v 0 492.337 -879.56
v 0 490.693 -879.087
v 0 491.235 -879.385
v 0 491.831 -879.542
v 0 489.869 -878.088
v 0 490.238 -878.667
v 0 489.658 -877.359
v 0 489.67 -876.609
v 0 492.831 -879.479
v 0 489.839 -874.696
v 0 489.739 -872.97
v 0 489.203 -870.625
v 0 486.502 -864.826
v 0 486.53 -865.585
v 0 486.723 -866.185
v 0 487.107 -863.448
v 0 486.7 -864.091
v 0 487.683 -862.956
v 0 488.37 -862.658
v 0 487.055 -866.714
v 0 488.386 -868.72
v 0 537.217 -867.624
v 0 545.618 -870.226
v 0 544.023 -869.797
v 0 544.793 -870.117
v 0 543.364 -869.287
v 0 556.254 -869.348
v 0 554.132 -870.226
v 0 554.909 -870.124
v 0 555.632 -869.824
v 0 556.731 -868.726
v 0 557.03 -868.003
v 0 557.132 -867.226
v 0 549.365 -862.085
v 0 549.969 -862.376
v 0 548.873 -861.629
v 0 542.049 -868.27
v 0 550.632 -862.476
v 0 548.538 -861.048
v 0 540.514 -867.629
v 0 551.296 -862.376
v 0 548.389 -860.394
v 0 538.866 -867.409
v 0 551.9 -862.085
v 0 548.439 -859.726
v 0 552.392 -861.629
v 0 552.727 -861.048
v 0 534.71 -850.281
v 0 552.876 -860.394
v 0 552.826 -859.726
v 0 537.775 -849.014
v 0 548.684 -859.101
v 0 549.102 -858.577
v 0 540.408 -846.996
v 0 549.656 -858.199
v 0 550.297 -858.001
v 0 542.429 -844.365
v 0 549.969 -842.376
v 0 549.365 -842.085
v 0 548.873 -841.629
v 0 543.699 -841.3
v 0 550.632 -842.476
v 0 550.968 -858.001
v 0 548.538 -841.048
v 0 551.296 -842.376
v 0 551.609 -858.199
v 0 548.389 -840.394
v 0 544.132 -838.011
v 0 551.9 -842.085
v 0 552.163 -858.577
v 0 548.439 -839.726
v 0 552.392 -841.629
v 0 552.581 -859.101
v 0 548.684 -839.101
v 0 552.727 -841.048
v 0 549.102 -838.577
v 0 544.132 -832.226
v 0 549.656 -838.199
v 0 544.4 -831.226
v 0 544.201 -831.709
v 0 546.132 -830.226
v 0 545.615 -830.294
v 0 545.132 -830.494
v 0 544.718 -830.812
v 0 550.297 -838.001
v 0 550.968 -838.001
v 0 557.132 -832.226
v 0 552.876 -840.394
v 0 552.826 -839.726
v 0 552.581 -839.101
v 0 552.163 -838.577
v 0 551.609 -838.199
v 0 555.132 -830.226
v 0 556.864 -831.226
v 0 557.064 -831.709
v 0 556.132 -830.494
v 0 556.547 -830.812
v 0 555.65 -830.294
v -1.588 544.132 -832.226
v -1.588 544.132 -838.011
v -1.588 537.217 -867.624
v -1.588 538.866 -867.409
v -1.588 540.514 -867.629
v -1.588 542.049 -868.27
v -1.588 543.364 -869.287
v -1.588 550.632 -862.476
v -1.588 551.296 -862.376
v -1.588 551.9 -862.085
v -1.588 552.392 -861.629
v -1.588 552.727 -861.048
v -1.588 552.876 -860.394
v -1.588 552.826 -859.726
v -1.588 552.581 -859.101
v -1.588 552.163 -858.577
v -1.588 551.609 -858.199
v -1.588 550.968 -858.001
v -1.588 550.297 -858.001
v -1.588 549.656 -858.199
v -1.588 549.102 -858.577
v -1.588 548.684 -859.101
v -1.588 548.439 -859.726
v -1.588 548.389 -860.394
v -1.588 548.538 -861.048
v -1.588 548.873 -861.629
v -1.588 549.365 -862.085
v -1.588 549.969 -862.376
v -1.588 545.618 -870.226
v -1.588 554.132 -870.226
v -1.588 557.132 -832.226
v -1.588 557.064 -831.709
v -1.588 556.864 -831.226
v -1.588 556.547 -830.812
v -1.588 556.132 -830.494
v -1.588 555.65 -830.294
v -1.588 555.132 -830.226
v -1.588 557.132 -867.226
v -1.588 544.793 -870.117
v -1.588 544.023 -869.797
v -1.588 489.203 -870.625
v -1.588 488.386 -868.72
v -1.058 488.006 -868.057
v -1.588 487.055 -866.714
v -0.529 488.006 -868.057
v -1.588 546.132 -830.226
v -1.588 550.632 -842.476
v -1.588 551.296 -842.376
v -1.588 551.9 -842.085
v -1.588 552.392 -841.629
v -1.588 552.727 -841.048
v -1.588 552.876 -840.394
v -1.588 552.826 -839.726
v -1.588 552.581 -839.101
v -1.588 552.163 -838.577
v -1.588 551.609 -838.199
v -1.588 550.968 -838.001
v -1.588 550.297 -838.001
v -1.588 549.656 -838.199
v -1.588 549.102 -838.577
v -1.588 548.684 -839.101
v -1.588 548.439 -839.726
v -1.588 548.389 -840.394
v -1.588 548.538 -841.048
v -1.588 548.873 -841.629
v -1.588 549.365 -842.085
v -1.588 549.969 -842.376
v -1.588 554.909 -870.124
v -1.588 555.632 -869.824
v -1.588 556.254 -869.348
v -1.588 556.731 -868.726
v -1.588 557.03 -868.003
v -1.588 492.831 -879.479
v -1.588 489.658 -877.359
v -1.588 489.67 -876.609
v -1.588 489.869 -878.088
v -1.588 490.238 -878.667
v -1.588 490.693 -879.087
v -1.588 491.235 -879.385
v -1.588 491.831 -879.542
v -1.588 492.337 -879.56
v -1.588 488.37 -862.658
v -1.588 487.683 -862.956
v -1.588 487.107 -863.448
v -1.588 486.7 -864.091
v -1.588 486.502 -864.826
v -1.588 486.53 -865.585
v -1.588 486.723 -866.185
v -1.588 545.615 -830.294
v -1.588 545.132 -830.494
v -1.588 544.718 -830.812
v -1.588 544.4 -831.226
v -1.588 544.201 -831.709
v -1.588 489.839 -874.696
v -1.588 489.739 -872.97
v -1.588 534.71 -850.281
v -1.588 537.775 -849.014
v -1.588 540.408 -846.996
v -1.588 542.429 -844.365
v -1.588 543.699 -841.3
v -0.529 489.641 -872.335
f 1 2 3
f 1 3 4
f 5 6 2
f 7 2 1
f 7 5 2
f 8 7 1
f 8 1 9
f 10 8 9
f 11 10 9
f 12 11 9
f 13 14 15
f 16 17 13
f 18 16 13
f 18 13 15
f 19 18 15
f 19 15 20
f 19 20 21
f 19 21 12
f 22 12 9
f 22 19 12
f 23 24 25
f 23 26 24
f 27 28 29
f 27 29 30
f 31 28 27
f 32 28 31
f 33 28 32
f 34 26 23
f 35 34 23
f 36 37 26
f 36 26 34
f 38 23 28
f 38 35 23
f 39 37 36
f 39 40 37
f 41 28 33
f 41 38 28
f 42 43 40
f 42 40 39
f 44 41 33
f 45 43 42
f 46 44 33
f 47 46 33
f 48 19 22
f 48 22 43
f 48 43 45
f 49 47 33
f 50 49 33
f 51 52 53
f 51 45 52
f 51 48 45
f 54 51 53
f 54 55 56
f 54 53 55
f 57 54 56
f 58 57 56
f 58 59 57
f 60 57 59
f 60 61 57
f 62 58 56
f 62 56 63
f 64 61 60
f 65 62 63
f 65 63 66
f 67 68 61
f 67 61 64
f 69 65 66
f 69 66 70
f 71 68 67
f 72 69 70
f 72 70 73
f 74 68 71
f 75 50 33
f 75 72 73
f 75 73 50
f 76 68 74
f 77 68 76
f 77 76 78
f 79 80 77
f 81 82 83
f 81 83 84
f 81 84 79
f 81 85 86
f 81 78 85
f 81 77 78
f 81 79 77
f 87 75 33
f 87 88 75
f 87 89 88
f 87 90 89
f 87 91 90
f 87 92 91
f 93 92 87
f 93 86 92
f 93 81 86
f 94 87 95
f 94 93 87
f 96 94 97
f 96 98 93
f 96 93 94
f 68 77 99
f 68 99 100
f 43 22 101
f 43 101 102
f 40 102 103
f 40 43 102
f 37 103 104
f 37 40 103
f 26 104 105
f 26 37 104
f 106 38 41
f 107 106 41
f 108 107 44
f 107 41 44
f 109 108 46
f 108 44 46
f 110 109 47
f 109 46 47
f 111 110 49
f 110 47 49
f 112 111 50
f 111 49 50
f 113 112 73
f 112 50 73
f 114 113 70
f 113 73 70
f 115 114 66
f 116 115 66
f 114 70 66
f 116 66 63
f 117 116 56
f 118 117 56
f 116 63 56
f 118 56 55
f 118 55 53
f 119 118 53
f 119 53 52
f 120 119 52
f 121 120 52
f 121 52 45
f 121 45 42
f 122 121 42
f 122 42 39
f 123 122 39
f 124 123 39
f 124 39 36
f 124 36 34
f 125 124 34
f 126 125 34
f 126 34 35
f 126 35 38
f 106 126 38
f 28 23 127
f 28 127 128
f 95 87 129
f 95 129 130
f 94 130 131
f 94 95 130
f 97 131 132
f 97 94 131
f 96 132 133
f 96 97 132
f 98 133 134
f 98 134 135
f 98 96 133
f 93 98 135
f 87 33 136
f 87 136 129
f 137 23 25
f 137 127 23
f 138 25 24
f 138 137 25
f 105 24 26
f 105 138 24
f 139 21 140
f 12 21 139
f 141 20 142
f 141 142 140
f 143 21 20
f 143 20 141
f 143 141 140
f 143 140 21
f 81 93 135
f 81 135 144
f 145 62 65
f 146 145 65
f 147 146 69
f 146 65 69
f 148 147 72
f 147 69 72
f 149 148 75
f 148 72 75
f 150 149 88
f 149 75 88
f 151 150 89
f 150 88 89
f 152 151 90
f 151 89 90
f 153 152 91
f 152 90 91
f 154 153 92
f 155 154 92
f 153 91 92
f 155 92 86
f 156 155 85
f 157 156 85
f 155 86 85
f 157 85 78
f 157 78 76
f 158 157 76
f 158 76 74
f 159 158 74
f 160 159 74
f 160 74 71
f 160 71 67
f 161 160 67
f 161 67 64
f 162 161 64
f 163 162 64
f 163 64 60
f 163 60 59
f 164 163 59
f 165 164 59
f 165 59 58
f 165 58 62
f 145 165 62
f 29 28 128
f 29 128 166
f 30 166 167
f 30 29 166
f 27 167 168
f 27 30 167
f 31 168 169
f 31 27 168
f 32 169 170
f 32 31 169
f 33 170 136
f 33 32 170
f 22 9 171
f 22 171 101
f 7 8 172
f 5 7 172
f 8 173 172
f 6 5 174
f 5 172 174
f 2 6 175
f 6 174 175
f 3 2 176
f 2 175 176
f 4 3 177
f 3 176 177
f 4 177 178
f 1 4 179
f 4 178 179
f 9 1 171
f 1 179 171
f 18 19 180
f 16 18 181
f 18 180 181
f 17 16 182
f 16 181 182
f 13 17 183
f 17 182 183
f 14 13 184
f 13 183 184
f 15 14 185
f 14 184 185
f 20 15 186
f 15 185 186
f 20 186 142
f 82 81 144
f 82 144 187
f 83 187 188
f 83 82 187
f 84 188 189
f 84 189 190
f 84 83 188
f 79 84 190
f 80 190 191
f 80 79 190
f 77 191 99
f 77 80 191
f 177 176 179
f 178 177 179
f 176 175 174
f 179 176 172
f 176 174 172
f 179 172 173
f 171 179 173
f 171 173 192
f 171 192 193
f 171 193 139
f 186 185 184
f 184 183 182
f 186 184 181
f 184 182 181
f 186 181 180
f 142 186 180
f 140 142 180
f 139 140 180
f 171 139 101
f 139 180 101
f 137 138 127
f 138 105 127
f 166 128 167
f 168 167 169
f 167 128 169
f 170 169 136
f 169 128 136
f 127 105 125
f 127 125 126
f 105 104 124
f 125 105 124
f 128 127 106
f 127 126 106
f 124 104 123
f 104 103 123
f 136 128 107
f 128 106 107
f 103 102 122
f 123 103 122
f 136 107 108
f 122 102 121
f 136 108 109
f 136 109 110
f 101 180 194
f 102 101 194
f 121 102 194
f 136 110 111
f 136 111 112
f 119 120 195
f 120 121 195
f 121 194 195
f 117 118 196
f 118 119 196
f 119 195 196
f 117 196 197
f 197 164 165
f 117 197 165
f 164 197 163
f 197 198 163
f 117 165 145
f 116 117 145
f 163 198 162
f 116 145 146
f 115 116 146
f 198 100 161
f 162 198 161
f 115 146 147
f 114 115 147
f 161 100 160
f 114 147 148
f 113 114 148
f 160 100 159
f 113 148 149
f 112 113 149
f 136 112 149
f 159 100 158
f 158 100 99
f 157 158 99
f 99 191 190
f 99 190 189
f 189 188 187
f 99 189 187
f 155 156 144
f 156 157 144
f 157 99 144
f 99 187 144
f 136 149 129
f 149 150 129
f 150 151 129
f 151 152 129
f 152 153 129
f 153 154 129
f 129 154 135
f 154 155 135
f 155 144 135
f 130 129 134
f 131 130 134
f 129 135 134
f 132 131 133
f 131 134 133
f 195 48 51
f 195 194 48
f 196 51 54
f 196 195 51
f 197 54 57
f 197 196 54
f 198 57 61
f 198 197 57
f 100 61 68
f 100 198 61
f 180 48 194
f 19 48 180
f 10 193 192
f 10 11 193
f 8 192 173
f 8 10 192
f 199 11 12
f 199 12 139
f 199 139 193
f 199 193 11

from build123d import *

# Parameters (mm, degrees)
BOSS_EXTRUDE1_DEPTH  = 1.5875
FILLET1_R            = 2.54
M4_CLEARANCE_HOLE1_D = 4.5
FILLET2_R            = 6.35
FILLET3_R            = 12.7
FILLET4_R            = 3.175


with BuildPart() as part:
    # Sketch1 → Boss-Extrude1 (new body)
    with BuildSketch(Plane(origin=(0, 0, 0), x_dir=(0, 0, -1), z_dir=(1, 0, 0))):
        with BuildLine():
            Line((832.226267655, 544.132439772), (843.624269089, 544.132439772))
            Line((843.624269089, 544.132439772), (847.764493389, 544.132439772))
            Line((847.764493389, 544.132439772), (865.776854812, 544.132439772))
            Line((865.776854812, 544.132439772), (869.917079112, 544.132439772))
            Line((869.917079112, 544.132439772), (870.226267655, 544.132439772))
            Line((870.226267655, 544.132439772), (870.226267655, 554.132439772))
            ThreePointArc((870.226267655, 554.132439772), (869.347587998, 556.253760115), (867.226267655, 557.132439772))
            Line((867.226267655, 557.132439772), (832.226267655, 557.132439772))
            ThreePointArc((832.226267655, 557.132439772), (830.812054092, 556.546653334), (830.226267655, 555.132439772))
            Line((830.226267655, 555.132439772), (830.226267655, 546.132439772))
            ThreePointArc((830.226267655, 546.132439772), (830.812054092, 544.718226209), (832.226267655, 544.132439772))
        make_face()
        with BuildLine():
            Line((847.764493389, 544.132439772), (863.880128333, 483.796291029))
            add(Edge.make_bspline(
                [(863.880128333, 483.796291029), (865.574478469, 486.592797057), (868.03804251, 488.340736874), (870.62475601, 489.202974707)],
                knots=[0.867438588, 0.867438588, 0.867438588, 0.867438588, 1, 1, 1, 1], degree=3, weights=[0.610334575, 0.693362976, 0.82325145, 1]))
            add(Edge.make_bspline(
                [(870.62475601, 489.202974707), (873.662795809, 490.21565464), (877.265107333, 490.148897283), (880.706436997, 488.236814526)],
                knots=[0, 0, 0, 0, 0.151032869, 0.151032869, 0.151032869, 0.151032869], degree=3, weights=[1, 0.798622841, 0.658074822, 0.578355943]))
            Line((880.706436997, 488.236814526), (865.776854812, 544.132439772))
            Line((865.776854812, 544.132439772), (847.764493389, 544.132439772))
        make_face()
    extrude(amount=-BOSS_EXTRUDE1_DEPTH)

    # Fillet1
    fillet1_edges = [part.edges().sort_by_distance(p)[0] for p in [
        (-0.79375, 488.236814526, -880.706436997),
        (-0.79375, 483.796291029, -863.880128333),
    ]]
    fillet(fillet1_edges, radius=FILLET1_R)

    # M4 Clearance Hole1 (through all)
    with Locations(Plane.ZY.offset(1.5875)):
        with Locations((-860.226267655, 550.632439772), (-840.226267655, 550.632439772)):
            Hole(M4_CLEARANCE_HOLE1_D / 2)

    # Fillet2
    # the kernel refuses this fillet: 6.35 mm, written as the material it adds along each edge
    with BuildSketch(Plane(origin=(0, 544.132439772, -865.776854812), x_dir=(0, -0.9661312310415323, -0.25805124376017496), z_dir=(-1, 0, 0))) as fillet2_piece_1:
        with BuildLine():
            CenterArc((7.157730316, -6.35), FILLET2_R, 90, 71.153326235)
            Line((1.148176518, -4.298716707), (1.027985442, -4.257691041))
            ThreePointArc((1.027985442, -4.257691041), (0.451389593, -2.182130862), (-0.122698666, -0.032772508))
            Line((-0.122698666, -0.032772508), (0, 0.127))
            Line((0, 0.127), (7.157730316, 0.127))
            Line((7.157730316, 0.127), (7.157730316, 0))
        make_face()
    extrude(amount=1.5875)

    # Fillet3
    fillet3_edges = [part.edges().sort_by_distance(p)[0] for p in [
        (-0.79375, 544.132439772, -847.764493389),
    ]]
    fillet(fillet3_edges, radius=FILLET3_R)

    # Fillet4
    fillet4_edges = [part.edges().sort_by_distance(p)[0] for p in [
        (-0.79375, 544.132439772, -870.226267655),
    ]]
    fillet(fillet4_edges, radius=FILLET4_R)


solid = part.part
